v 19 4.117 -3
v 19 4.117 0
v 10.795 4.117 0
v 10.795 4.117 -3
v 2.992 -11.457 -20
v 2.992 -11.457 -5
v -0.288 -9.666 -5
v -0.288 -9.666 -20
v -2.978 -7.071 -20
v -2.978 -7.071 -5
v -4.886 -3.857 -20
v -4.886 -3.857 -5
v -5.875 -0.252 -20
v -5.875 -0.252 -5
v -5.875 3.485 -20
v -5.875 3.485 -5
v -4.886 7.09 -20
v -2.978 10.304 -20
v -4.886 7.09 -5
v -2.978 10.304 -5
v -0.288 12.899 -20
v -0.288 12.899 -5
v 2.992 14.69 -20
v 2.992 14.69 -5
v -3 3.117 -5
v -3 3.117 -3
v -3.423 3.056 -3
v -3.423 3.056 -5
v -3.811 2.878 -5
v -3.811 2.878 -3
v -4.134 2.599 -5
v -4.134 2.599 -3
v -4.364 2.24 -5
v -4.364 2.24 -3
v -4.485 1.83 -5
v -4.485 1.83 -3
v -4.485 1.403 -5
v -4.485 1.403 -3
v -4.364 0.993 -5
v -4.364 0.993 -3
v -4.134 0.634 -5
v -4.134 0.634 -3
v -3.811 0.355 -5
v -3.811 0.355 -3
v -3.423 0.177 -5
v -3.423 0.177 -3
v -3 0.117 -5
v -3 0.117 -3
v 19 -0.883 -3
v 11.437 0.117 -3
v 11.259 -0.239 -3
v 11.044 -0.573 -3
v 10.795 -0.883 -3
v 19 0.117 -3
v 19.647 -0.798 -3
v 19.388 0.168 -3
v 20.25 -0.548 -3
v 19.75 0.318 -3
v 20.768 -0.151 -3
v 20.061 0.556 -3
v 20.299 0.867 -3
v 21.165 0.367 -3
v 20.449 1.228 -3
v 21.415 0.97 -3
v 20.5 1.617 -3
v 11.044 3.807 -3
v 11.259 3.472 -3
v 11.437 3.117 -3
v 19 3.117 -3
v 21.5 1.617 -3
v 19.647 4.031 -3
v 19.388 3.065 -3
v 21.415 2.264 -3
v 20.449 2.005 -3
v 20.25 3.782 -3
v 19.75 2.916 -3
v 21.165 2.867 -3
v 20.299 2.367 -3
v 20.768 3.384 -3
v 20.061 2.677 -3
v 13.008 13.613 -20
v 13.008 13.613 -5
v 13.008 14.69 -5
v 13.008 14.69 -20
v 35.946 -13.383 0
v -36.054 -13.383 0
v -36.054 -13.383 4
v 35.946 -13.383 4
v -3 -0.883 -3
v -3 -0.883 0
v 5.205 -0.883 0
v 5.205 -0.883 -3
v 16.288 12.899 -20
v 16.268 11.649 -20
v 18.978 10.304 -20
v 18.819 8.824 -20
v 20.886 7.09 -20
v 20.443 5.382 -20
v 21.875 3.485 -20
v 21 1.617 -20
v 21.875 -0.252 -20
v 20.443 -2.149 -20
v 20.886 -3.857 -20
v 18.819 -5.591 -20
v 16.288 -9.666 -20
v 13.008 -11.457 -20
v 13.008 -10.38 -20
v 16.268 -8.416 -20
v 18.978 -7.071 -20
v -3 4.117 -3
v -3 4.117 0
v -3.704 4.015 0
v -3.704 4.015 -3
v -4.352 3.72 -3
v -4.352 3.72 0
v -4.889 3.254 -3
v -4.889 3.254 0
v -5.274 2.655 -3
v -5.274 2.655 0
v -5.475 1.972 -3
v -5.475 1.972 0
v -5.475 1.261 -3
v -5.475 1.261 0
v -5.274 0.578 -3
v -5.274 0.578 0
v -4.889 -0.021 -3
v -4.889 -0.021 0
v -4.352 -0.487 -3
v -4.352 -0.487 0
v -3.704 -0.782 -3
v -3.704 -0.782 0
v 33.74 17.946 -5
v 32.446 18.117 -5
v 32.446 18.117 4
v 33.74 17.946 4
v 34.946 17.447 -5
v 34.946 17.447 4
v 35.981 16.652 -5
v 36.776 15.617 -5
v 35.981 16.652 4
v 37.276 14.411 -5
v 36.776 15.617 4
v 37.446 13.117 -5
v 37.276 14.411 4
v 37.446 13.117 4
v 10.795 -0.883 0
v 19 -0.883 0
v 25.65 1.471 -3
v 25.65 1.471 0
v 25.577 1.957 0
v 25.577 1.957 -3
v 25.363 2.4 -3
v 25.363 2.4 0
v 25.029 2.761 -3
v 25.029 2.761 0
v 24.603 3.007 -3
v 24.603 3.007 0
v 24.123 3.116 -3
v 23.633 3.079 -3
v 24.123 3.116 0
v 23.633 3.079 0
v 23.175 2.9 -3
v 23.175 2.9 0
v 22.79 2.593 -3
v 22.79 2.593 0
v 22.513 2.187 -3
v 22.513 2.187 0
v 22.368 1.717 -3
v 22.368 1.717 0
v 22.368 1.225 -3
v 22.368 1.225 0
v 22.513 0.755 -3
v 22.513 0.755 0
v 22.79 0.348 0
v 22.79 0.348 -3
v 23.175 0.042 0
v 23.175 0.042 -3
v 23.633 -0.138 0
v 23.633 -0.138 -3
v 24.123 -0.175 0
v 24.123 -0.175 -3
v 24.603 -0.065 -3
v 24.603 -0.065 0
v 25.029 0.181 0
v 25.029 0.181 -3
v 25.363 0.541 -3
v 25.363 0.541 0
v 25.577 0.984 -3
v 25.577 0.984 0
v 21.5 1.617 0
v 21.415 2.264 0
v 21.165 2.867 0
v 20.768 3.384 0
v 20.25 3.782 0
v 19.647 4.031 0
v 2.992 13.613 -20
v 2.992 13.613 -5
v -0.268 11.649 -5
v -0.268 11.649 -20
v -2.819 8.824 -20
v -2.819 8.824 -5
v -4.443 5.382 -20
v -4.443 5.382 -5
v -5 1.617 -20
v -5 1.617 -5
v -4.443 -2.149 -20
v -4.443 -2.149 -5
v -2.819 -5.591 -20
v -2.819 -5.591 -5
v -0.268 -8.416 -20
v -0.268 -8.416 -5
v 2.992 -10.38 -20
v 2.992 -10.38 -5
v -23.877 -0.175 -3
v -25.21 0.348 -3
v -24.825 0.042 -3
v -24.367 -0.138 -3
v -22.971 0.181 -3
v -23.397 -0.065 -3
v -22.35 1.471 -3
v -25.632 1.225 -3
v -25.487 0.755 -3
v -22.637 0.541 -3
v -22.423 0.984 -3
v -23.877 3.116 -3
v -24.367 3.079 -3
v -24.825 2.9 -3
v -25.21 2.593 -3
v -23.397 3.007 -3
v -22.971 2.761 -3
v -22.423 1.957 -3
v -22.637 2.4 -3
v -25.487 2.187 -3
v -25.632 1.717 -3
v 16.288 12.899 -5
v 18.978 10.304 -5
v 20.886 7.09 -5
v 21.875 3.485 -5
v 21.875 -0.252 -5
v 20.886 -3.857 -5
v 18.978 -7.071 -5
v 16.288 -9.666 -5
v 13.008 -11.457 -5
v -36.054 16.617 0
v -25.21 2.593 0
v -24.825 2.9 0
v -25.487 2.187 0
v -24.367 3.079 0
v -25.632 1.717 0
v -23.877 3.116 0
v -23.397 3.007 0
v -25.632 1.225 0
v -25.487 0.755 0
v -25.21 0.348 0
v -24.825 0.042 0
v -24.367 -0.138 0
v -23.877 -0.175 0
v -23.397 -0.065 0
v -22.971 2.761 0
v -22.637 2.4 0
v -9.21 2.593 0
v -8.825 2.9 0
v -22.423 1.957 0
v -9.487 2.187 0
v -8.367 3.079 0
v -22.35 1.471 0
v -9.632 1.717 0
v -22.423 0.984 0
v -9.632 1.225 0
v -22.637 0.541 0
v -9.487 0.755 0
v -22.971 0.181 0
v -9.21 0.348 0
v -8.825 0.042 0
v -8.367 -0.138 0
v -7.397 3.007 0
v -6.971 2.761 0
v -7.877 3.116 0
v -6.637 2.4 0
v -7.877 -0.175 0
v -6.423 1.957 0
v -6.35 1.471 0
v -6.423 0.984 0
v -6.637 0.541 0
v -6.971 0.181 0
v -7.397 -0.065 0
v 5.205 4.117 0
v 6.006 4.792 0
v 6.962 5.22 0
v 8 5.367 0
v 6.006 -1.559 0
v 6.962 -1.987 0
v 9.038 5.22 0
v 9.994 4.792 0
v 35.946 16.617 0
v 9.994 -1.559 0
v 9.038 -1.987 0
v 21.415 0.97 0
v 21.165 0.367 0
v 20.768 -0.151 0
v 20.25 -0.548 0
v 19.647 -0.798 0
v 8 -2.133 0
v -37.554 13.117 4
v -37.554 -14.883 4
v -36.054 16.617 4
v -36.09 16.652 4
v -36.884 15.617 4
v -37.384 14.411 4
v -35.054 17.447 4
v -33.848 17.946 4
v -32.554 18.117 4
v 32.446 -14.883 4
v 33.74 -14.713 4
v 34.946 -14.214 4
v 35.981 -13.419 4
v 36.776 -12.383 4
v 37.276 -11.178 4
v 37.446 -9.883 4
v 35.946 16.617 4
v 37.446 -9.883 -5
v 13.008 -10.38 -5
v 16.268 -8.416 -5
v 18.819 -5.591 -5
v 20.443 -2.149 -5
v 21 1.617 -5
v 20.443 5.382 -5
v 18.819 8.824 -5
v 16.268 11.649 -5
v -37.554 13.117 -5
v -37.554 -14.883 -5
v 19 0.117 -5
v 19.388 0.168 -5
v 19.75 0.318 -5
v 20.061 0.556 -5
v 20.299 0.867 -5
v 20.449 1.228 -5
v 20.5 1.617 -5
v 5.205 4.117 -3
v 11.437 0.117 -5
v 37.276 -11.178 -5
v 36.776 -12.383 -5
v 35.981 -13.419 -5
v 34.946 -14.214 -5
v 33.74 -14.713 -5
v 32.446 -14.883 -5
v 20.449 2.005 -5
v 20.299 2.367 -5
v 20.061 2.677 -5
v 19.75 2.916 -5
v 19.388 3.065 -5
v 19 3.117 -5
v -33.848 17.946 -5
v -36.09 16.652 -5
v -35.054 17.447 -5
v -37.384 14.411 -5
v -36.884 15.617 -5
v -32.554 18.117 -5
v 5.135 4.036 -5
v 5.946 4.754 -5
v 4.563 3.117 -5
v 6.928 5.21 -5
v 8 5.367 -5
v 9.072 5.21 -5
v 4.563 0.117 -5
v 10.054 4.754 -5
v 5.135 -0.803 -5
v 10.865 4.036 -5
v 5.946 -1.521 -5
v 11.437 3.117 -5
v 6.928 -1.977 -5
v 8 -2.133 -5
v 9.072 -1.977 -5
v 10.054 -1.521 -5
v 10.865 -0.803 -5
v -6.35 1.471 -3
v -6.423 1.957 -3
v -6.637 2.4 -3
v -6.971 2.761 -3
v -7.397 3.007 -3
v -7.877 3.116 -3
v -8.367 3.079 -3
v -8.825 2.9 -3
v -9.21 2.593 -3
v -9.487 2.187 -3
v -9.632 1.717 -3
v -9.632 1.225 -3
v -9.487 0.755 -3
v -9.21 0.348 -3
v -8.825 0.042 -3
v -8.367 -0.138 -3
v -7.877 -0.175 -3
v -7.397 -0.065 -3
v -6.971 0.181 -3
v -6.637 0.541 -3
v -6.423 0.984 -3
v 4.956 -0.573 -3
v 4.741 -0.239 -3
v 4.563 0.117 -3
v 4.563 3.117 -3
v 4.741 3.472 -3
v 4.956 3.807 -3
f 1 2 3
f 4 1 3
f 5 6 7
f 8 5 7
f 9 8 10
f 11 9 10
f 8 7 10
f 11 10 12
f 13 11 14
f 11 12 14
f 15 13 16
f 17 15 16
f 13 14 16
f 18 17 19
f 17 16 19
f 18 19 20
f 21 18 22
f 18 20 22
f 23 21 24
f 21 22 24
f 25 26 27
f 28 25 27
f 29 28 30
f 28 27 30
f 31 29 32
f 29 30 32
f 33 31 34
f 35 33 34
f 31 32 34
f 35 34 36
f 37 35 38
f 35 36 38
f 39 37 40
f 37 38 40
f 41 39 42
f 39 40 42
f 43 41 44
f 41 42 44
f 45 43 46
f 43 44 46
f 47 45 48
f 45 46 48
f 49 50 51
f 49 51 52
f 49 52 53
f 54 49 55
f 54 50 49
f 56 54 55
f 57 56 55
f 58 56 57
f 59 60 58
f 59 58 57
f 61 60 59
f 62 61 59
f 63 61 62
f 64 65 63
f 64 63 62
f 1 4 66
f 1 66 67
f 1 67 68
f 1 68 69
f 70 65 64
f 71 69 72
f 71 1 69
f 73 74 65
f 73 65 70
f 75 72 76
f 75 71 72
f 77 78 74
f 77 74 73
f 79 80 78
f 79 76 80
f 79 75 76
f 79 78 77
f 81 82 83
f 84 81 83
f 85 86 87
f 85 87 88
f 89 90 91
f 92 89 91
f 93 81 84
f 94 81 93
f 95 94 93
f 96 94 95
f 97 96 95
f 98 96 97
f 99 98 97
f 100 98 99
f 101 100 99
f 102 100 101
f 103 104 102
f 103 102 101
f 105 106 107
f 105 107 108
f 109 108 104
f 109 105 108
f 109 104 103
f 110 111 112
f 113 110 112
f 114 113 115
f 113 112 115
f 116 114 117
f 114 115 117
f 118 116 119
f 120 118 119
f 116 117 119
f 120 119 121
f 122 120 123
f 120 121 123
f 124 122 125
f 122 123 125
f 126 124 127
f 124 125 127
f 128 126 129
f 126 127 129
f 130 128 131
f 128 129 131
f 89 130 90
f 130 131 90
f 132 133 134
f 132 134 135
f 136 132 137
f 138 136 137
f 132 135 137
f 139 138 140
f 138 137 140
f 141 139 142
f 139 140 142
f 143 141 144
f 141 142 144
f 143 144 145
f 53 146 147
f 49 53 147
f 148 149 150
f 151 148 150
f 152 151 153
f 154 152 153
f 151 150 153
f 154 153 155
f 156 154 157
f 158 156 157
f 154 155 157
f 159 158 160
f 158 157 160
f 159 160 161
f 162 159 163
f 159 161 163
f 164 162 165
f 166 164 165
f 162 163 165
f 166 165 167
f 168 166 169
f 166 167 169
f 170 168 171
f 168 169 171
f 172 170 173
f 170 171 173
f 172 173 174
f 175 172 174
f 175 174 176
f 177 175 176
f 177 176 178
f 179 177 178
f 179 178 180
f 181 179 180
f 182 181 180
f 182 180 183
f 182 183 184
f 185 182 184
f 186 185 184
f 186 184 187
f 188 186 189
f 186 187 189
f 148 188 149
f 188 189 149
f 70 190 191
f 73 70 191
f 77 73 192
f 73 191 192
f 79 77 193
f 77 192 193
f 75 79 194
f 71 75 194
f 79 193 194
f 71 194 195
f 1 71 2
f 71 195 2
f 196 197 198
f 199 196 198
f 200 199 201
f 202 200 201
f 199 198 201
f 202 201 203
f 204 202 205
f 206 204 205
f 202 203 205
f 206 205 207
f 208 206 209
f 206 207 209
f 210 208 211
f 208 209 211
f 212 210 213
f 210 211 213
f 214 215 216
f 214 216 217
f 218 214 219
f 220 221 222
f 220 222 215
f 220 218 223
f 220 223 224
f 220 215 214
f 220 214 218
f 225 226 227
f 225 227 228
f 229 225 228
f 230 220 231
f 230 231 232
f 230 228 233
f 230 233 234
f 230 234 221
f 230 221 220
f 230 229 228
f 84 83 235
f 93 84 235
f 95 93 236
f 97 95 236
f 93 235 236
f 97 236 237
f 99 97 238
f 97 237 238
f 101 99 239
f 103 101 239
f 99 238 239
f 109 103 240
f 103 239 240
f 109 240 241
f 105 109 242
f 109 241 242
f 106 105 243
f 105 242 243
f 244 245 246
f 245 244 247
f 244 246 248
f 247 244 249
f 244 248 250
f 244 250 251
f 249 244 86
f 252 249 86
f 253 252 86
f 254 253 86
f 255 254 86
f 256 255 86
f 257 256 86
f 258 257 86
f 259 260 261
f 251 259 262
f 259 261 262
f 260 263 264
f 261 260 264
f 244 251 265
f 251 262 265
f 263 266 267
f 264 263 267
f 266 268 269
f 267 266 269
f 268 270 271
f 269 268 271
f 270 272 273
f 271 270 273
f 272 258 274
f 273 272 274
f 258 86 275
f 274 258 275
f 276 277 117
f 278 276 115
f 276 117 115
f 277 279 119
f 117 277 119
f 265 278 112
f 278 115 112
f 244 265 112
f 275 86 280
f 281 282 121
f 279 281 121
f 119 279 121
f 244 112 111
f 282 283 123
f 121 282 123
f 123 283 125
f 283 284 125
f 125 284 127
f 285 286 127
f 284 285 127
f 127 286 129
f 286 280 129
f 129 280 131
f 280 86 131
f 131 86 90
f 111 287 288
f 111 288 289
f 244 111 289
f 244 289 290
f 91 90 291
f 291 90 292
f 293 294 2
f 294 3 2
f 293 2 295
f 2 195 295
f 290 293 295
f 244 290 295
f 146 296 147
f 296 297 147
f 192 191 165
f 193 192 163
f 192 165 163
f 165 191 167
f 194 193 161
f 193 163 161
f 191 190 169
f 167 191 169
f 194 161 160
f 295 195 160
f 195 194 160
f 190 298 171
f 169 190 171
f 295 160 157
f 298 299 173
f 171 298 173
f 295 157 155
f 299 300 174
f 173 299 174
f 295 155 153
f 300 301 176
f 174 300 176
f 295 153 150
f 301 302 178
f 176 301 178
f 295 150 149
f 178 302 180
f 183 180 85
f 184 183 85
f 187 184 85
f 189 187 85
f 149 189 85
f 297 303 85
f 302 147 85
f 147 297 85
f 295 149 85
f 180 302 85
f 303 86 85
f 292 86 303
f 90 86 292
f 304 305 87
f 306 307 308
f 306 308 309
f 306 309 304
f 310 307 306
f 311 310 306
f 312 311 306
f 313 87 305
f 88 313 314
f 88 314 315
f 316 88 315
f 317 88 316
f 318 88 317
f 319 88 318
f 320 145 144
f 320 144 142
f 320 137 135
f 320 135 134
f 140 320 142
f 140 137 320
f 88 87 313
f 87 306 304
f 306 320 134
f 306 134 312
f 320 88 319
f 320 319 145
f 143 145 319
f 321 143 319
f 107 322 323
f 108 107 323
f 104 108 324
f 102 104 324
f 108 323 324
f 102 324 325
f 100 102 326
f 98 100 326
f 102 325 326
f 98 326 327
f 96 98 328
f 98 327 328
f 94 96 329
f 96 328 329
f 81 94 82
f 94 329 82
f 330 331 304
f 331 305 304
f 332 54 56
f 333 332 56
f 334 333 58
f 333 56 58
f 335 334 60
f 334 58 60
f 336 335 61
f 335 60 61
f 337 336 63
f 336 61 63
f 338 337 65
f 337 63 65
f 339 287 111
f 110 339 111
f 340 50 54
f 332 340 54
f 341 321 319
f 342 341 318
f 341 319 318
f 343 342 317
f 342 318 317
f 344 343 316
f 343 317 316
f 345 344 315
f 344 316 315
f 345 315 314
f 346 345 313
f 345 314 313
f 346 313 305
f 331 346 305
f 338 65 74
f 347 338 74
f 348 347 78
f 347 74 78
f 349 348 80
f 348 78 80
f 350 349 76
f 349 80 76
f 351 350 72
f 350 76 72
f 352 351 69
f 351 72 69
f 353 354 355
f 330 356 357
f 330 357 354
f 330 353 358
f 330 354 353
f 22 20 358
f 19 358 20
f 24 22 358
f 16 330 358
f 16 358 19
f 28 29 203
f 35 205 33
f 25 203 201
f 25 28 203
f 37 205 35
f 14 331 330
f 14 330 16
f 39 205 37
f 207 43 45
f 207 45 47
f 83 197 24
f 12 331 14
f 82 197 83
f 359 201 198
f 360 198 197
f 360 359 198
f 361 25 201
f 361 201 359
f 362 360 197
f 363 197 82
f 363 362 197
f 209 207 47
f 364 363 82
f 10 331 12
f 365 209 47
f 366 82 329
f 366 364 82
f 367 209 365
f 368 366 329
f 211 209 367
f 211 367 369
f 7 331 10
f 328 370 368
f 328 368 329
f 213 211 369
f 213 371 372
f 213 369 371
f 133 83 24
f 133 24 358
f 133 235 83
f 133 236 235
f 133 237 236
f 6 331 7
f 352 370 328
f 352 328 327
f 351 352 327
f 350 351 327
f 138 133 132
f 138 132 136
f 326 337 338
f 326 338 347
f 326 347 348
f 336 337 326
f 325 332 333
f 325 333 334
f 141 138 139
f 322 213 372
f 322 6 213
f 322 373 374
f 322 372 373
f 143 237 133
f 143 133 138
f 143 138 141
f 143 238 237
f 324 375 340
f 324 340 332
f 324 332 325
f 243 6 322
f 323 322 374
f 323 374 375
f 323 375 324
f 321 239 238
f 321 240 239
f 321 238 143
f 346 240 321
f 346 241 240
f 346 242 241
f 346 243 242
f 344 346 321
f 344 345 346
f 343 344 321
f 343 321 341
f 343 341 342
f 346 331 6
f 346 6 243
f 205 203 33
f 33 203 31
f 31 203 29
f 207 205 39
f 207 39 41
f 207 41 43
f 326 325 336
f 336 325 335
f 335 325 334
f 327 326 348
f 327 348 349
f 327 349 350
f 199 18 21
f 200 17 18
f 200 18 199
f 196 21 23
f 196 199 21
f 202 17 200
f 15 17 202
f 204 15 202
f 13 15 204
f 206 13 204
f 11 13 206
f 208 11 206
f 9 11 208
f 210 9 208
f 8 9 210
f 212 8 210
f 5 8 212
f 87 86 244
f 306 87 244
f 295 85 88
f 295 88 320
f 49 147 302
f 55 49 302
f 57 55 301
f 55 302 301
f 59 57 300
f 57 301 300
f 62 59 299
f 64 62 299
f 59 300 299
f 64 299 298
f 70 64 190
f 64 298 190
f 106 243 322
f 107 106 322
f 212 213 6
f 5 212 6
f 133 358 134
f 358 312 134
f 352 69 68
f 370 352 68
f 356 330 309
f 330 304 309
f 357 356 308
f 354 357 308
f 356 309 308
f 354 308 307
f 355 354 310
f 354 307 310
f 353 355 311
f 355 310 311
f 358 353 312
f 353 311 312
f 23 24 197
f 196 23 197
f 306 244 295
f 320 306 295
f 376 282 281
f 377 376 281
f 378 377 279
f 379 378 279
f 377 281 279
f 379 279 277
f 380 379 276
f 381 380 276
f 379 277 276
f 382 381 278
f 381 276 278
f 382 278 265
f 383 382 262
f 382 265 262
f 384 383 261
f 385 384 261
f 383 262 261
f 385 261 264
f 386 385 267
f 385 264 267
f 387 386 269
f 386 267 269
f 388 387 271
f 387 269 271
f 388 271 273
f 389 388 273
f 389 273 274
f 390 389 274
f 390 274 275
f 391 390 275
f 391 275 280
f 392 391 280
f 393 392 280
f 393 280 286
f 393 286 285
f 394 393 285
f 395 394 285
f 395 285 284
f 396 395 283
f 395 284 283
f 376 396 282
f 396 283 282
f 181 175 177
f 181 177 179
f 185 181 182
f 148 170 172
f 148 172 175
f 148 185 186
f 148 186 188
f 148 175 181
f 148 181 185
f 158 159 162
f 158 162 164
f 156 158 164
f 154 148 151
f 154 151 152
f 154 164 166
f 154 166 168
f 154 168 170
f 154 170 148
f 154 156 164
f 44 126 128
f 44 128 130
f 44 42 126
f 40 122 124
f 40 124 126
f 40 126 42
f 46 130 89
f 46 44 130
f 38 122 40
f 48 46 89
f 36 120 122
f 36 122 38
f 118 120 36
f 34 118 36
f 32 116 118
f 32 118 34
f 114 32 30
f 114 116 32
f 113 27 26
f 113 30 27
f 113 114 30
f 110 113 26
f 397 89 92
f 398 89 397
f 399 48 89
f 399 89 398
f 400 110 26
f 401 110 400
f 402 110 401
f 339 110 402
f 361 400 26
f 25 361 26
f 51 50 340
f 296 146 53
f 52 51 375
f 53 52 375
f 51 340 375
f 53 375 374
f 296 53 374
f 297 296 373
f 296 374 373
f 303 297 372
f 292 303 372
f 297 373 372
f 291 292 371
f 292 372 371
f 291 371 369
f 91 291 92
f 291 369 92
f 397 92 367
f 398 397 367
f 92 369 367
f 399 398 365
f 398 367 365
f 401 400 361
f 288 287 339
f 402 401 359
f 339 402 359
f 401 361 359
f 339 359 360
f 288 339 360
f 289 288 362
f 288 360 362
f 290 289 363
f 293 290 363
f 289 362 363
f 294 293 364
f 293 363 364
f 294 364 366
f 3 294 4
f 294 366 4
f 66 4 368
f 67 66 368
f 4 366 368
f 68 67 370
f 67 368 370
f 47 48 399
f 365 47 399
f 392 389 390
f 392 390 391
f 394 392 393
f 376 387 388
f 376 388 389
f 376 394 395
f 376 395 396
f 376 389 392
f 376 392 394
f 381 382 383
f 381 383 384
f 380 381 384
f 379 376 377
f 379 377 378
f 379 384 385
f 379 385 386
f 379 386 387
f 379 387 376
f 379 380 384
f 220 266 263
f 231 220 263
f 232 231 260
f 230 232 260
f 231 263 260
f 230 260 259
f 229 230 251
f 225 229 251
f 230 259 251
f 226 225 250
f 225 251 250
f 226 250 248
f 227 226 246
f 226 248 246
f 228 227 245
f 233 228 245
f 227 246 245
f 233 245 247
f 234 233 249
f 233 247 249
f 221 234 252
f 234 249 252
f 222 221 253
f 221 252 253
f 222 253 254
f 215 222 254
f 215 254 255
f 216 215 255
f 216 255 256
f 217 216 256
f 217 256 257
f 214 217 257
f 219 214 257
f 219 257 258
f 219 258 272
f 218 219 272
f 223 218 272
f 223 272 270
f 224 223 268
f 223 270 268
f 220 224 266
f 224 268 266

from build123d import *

# Parameters (mm, degrees)
F0_W      = 72
F0_H      = 30
F1_DEPTH  = 4
F3_DEPTH  = 5
F4_R      = 3.75
F5_DEPTH  = 9.001
F8_DEPTH  = 15
F10_DEPTH = 25
F12_DEPTH = 3
F13_R     = 1.65
F14_DEPTH = 3


with BuildPart() as f1:
    # F0 (on Top) → F1 (new body)
    with BuildSketch(Plane.XY):
        with BuildLine():
            ThreePointArc((37.445899, 13.116578), (35.981432, 16.652112), (32.445899, 18.116578))
            Line((32.445899, 18.116578), (-32.554101, 18.116578))
            ThreePointArc((-32.554101, 18.116578), (-36.089635, 16.652112), (-37.554101, 13.116578))
            Line((-37.554101, 13.116578), (-37.554101, -9.883422))
            Line((-37.554101, -9.883422), (-37.554101, -14.883422))
            Line((-37.554101, -14.883422), (-32.554101, -14.883422))
            Line((-32.554101, -14.883422), (32.445899, -14.883422))
            ThreePointArc((32.445899, -14.883422), (35.981432, -13.418956), (37.445899, -9.883422))
            Line((37.445899, -9.883422), (37.445899, 13.116578))
        make_face()
        with Locations((-0.054101, 1.616578)):
            Rectangle(F0_W, F0_H, mode=Mode.SUBTRACT)
    extrude(amount=F1_DEPTH)

    # F2 (on face) → F3 (join)
    with BuildSketch(Plane(origin=(0, 0, 0), x_dir=(1, 0, 0), z_dir=(0, 0, -1))):
        with BuildLine():
            Line((32.445899, 14.883422), (-37.554101, 14.883422))
            Line((-37.554101, 14.883422), (-37.554101, -13.116578))
            ThreePointArc((-37.554101, -13.116578), (-36.089635, -16.652112), (-32.554101, -18.116578))
            Line((-32.554101, -18.116578), (32.445899, -18.116578))
            ThreePointArc((32.445899, -18.116578), (35.981432, -16.652112), (37.445899, -13.116578))
            Line((37.445899, -13.116578), (37.445899, 9.883422))
            ThreePointArc((37.445899, 9.883422), (35.981432, 13.418956), (32.445899, 14.883422))
        make_face()
    extrude(amount=F3_DEPTH)

    # F4 (on face) → F5 (cut, through all)
    with BuildSketch(Plane(origin=(0, 0, -5), x_dir=(1, 0, 0), z_dir=(0, 0, -1))):
        with Locations((8, -1.616578)):
            Circle(F4_R)
    extrude(amount=-F5_DEPTH, mode=Mode.SUBTRACT)

    # F7 (on face) → F8 (join)
    with BuildSketch(Plane(origin=(0, 0, -5), x_dir=(1, 0, 0), z_dir=(0, 0, -1))):
        with BuildLine():
            ThreePointArc((2.992242, -13.613343), (-5, -1.616578), (2.992242, 10.380186))
            Line((2.992242, 10.380186), (2.992242, 11.45715))
            ThreePointArc((2.992242, 11.45715), (-6, -1.616578), (2.992242, -14.690306))
            Line((2.992242, -14.690306), (2.992242, -13.613343))
        make_face()
        with BuildLine():
            ThreePointArc((13.007758, -14.690306), (22, -1.616578), (13.007758, 11.45715))
            Line((13.007758, 11.45715), (13.007758, 10.380186))
            ThreePointArc((13.007758, 10.380186), (21, -1.616578), (13.007758, -13.613343))
            Line((13.007758, -13.613343), (13.007758, -14.690306))
        make_face()
    extrude(amount=F8_DEPTH)

    # F9 (on face) → F10 (cut)
    with BuildSketch(Plane.XY):
        with BuildLine():
            ThreePointArc((19, 0.116578), (20.06066, 0.555918), (20.5, 1.616578))
            ThreePointArc((20.5, 1.616578), (20.06066, 2.677238), (19, 3.116578))
            ThreePointArc((19, 3.116578), (17.5, 1.616578), (19, 0.116578))
        make_face()
        with BuildLine():
            ThreePointArc((19, 0.116578), (17.5, 1.616578), (19, 3.116578))
            Line((19, 3.116578), (-3, 3.116578))
            ThreePointArc((-3, 3.116578), (-1.93934, 2.677238), (-1.5, 1.616578))
            ThreePointArc((-1.5, 1.616578), (-1.93934, 0.555918), (-3, 0.116578))
            Line((-3, 0.116578), (19, 0.116578))
        make_face()
        with BuildLine():
            ThreePointArc((-1.5, 1.616578), (-1.93934, 2.677238), (-3, 3.116578))
            ThreePointArc((-3, 3.116578), (-4.5, 1.616578), (-3, 0.116578))
            ThreePointArc((-3, 0.116578), (-1.93934, 0.555918), (-1.5, 1.616578))
        make_face()
    extrude(amount=-F10_DEPTH, mode=Mode.SUBTRACT)

    # F11 (on face) → F12 (cut)
    with BuildSketch(Plane.XY):
        with BuildLine():
            ThreePointArc((-3, -0.883422), (-1.232233, -0.151189), (-0.5, 1.616578))
            ThreePointArc((-0.5, 1.616578), (-1.232233, 3.384345), (-3, 4.116578))
            ThreePointArc((-3, 4.116578), (-5.5, 1.616578), (-3, -0.883422))
        make_face()
        with BuildLine():
            ThreePointArc((-3, 4.116578), (-1.232233, 3.384345), (-0.5, 1.616578))
            ThreePointArc((-0.5, 1.616578), (-1.232233, -0.151189), (-3, -0.883422))
            Line((-3, -0.883422), (19, -0.883422))
            ThreePointArc((19, -0.883422), (16.5, 1.616578), (19, 4.116578))
            Line((19, 4.116578), (-3, 4.116578))
        make_face()
        with BuildLine():
            ThreePointArc((21.5, 1.616578), (20.767767, 3.384345), (19, 4.116578))
            ThreePointArc((19, 4.116578), (16.5, 1.616578), (19, -0.883422))
            ThreePointArc((19, -0.883422), (20.767767, -0.151189), (21.5, 1.616578))
        make_face()
    extrude(amount=-F12_DEPTH, mode=Mode.SUBTRACT)

    # F13 (on face) → F14 (cut)
    with BuildSketch(Plane.XY):
        with Locations((-24, 1.470634)):
            Circle(F13_R)
        with Locations((-8, 1.470634)):
            Circle(F13_R)
        with Locations((8, 1.470634)):
            Circle(F13_R)
        with Locations((24, 1.470634)):
            Circle(F13_R)
    extrude(amount=-F14_DEPTH, mode=Mode.SUBTRACT)


solid = f1.part
